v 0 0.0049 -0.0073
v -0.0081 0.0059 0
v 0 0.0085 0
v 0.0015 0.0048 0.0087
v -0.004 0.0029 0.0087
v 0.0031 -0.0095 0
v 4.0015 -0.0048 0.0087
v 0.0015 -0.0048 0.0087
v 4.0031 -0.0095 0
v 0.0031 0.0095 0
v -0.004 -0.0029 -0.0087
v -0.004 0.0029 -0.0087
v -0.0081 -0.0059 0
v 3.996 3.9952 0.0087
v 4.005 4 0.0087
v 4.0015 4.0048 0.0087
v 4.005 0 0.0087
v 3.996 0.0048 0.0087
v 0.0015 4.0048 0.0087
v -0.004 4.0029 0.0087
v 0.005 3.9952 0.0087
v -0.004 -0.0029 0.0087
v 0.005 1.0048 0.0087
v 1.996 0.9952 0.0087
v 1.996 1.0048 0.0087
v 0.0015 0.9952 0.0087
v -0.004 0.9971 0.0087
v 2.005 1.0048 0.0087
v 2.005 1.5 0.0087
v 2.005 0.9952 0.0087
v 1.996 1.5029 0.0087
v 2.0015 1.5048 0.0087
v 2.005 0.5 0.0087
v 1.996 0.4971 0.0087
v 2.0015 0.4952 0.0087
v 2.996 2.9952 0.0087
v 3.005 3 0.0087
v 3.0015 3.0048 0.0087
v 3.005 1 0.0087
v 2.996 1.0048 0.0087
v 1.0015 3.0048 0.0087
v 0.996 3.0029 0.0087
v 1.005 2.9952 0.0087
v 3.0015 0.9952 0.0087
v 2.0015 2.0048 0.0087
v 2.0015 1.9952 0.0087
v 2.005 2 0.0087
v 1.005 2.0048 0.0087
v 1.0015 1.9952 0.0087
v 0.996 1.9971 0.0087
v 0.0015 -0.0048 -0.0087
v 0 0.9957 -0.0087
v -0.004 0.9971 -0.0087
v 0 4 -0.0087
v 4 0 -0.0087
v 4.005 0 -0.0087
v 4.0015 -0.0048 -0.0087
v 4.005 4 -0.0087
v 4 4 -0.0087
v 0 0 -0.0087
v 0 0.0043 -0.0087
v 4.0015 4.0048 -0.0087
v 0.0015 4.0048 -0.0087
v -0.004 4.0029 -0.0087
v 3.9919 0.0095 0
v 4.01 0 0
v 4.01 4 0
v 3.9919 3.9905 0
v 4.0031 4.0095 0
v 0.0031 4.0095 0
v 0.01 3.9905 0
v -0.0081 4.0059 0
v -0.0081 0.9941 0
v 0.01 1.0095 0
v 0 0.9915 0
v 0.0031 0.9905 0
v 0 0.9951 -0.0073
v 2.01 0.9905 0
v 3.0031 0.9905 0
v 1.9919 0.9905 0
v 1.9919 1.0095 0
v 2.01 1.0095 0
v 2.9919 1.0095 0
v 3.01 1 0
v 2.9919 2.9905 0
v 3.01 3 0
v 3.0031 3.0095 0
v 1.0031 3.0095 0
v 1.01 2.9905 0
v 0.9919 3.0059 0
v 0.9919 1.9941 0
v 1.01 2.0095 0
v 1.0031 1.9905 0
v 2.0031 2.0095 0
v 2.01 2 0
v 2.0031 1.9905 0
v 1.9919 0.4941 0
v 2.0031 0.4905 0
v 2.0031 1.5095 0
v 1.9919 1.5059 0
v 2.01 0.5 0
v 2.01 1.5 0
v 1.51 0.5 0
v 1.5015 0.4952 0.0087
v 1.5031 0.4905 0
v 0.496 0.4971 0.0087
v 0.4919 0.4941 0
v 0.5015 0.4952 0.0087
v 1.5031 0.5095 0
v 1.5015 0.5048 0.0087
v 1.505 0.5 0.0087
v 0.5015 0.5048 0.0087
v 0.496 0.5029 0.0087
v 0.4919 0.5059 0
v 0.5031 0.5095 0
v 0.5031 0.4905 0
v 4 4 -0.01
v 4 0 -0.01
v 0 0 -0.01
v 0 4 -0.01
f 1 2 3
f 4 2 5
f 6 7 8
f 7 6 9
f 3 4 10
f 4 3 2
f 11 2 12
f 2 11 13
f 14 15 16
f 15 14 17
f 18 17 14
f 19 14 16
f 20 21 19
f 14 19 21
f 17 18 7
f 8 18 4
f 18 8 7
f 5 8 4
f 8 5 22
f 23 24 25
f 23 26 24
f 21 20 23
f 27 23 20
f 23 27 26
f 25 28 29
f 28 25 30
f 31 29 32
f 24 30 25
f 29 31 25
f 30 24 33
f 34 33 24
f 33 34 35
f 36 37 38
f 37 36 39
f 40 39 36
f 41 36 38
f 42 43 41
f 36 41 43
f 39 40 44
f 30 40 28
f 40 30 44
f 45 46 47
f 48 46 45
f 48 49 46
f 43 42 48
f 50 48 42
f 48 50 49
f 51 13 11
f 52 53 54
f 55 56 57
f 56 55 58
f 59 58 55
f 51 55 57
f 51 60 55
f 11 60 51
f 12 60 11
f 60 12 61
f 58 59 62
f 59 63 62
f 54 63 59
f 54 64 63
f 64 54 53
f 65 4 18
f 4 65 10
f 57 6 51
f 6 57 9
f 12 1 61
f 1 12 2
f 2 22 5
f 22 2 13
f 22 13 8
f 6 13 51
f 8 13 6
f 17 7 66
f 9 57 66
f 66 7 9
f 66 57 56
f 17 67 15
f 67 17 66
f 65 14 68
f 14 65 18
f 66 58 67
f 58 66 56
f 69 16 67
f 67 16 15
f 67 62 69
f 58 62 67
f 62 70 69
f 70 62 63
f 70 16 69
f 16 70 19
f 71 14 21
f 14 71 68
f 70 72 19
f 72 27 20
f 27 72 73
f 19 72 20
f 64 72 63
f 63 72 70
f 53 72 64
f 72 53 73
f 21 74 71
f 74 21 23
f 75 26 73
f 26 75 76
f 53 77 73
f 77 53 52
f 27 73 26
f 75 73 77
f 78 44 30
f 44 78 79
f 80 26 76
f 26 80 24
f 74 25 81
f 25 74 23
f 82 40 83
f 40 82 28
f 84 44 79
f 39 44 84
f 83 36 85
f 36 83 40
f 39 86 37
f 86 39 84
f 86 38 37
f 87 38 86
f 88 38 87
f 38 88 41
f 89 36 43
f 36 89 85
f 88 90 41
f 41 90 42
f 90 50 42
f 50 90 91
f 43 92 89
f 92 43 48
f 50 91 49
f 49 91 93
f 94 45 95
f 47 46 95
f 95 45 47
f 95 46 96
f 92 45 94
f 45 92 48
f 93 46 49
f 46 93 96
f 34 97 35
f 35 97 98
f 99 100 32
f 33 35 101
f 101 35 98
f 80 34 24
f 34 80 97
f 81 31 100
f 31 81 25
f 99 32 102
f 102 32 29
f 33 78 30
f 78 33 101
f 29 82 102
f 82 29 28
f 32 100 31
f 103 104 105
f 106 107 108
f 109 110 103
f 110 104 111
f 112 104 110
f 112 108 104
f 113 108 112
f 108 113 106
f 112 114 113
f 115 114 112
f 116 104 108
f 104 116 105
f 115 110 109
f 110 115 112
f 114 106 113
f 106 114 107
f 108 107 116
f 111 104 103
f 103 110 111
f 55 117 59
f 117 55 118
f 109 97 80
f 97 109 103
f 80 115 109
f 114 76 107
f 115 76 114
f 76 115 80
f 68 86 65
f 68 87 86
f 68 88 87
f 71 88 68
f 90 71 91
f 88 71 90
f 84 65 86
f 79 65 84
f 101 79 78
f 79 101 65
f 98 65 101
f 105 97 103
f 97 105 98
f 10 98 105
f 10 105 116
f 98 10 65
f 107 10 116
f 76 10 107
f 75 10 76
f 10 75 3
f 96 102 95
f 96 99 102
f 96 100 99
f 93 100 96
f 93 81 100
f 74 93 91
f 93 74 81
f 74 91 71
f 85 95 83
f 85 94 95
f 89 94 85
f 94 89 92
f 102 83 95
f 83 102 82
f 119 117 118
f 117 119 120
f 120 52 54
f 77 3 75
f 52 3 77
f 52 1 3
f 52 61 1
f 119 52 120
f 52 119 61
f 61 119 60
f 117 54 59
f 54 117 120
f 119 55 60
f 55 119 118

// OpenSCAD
hull(){
    translate([0.0, 0.0]) sphere(0.01);
    translate([1.0, 0.0]) sphere(0.01);
}
hull(){
    translate([1.0, 0.0]) sphere(0.01);
    translate([2.0, 0.0]) sphere(0.01);
}
hull(){
    translate([2.0, 0.0]) sphere(0.01);
    translate([3.0, 0.0]) sphere(0.01);
}
hull(){
    translate([3.0, 0.0]) sphere(0.01);
    translate([4.0, 0.0]) sphere(0.01);
}
hull(){
    translate([4.0, 0.0]) sphere(0.01);
    translate([4.0, 1.0]) sphere(0.01);
}
hull(){
    translate([4.0, 1.0]) sphere(0.01);
    translate([4.0, 2.0]) sphere(0.01);
}
hull(){
    translate([4.0, 2.0]) sphere(0.01);
    translate([4.0, 3.0]) sphere(0.01);
}
hull(){
    translate([4.0, 3.0]) sphere(0.01);
    translate([4.0, 4.0]) sphere(0.01);
}
hull(){
    translate([4.0, 4.0]) sphere(0.01);
    translate([3.0, 4.0]) sphere(0.01);
}
hull(){
    translate([3.0, 4.0]) sphere(0.01);
    translate([2.0, 4.0]) sphere(0.01);
}
hull(){
    translate([2.0, 4.0]) sphere(0.01);
    translate([1.0, 4.0]) sphere(0.01);
}
hull(){
    translate([1.0, 4.0]) sphere(0.01);
    translate([0.0, 4.0]) sphere(0.01);
}
hull(){
    translate([0.0, 4.0]) sphere(0.01);
    translate([0.0, 3.0]) sphere(0.01);
}
hull(){
    translate([0.0, 3.0]) sphere(0.01);
    translate([0.0, 2.0]) sphere(0.01);
}
hull(){
    translate([0.0, 2.0]) sphere(0.01);
    translate([0.0, 1.0]) sphere(0.01);
}
hull(){
    translate([0.0, 1.0]) sphere(0.01);
    translate([1.0, 1.0]) sphere(0.01);
}
hull(){
    translate([1.0, 1.0]) sphere(0.01);
    translate([2.0, 1.0]) sphere(0.01);
}
hull(){
    translate([2.0, 1.0]) sphere(0.01);
    translate([3.0, 1.0]) sphere(0.01);
}
hull(){
    translate([3.0, 1.0]) sphere(0.01);
    translate([3.0, 2.0]) sphere(0.01);
}
hull(){
    translate([3.0, 2.0]) sphere(0.01);
    translate([3.0, 3.0]) sphere(0.01);
}
hull(){
    translate([3.0, 3.0]) sphere(0.01);
    translate([2.0, 3.0]) sphere(0.01);
}
hull(){
    translate([2.0, 3.0]) sphere(0.01);
    translate([1.0, 3.0]) sphere(0.01);
}
hull(){
    translate([1.0, 3.0]) sphere(0.01);
    translate([1.0, 2.0]) sphere(0.01);
}
hull(){
    translate([1.0, 2.0]) sphere(0.01);
    translate([2.0, 2.0]) sphere(0.01);
}
hull(){
    translate([2.0, 1.5]) sphere(0.01);
    translate([2.0, 0.5]) sphere(0.01);
}
hull(){
    translate([1.5, 0.5]) sphere(0.01);
    translate([0.5, 0.5]) sphere(0.01);
}
translate([0,0,-0.01]) color([0.1,0.1,0.1]) cube([4,4,0.01]);
